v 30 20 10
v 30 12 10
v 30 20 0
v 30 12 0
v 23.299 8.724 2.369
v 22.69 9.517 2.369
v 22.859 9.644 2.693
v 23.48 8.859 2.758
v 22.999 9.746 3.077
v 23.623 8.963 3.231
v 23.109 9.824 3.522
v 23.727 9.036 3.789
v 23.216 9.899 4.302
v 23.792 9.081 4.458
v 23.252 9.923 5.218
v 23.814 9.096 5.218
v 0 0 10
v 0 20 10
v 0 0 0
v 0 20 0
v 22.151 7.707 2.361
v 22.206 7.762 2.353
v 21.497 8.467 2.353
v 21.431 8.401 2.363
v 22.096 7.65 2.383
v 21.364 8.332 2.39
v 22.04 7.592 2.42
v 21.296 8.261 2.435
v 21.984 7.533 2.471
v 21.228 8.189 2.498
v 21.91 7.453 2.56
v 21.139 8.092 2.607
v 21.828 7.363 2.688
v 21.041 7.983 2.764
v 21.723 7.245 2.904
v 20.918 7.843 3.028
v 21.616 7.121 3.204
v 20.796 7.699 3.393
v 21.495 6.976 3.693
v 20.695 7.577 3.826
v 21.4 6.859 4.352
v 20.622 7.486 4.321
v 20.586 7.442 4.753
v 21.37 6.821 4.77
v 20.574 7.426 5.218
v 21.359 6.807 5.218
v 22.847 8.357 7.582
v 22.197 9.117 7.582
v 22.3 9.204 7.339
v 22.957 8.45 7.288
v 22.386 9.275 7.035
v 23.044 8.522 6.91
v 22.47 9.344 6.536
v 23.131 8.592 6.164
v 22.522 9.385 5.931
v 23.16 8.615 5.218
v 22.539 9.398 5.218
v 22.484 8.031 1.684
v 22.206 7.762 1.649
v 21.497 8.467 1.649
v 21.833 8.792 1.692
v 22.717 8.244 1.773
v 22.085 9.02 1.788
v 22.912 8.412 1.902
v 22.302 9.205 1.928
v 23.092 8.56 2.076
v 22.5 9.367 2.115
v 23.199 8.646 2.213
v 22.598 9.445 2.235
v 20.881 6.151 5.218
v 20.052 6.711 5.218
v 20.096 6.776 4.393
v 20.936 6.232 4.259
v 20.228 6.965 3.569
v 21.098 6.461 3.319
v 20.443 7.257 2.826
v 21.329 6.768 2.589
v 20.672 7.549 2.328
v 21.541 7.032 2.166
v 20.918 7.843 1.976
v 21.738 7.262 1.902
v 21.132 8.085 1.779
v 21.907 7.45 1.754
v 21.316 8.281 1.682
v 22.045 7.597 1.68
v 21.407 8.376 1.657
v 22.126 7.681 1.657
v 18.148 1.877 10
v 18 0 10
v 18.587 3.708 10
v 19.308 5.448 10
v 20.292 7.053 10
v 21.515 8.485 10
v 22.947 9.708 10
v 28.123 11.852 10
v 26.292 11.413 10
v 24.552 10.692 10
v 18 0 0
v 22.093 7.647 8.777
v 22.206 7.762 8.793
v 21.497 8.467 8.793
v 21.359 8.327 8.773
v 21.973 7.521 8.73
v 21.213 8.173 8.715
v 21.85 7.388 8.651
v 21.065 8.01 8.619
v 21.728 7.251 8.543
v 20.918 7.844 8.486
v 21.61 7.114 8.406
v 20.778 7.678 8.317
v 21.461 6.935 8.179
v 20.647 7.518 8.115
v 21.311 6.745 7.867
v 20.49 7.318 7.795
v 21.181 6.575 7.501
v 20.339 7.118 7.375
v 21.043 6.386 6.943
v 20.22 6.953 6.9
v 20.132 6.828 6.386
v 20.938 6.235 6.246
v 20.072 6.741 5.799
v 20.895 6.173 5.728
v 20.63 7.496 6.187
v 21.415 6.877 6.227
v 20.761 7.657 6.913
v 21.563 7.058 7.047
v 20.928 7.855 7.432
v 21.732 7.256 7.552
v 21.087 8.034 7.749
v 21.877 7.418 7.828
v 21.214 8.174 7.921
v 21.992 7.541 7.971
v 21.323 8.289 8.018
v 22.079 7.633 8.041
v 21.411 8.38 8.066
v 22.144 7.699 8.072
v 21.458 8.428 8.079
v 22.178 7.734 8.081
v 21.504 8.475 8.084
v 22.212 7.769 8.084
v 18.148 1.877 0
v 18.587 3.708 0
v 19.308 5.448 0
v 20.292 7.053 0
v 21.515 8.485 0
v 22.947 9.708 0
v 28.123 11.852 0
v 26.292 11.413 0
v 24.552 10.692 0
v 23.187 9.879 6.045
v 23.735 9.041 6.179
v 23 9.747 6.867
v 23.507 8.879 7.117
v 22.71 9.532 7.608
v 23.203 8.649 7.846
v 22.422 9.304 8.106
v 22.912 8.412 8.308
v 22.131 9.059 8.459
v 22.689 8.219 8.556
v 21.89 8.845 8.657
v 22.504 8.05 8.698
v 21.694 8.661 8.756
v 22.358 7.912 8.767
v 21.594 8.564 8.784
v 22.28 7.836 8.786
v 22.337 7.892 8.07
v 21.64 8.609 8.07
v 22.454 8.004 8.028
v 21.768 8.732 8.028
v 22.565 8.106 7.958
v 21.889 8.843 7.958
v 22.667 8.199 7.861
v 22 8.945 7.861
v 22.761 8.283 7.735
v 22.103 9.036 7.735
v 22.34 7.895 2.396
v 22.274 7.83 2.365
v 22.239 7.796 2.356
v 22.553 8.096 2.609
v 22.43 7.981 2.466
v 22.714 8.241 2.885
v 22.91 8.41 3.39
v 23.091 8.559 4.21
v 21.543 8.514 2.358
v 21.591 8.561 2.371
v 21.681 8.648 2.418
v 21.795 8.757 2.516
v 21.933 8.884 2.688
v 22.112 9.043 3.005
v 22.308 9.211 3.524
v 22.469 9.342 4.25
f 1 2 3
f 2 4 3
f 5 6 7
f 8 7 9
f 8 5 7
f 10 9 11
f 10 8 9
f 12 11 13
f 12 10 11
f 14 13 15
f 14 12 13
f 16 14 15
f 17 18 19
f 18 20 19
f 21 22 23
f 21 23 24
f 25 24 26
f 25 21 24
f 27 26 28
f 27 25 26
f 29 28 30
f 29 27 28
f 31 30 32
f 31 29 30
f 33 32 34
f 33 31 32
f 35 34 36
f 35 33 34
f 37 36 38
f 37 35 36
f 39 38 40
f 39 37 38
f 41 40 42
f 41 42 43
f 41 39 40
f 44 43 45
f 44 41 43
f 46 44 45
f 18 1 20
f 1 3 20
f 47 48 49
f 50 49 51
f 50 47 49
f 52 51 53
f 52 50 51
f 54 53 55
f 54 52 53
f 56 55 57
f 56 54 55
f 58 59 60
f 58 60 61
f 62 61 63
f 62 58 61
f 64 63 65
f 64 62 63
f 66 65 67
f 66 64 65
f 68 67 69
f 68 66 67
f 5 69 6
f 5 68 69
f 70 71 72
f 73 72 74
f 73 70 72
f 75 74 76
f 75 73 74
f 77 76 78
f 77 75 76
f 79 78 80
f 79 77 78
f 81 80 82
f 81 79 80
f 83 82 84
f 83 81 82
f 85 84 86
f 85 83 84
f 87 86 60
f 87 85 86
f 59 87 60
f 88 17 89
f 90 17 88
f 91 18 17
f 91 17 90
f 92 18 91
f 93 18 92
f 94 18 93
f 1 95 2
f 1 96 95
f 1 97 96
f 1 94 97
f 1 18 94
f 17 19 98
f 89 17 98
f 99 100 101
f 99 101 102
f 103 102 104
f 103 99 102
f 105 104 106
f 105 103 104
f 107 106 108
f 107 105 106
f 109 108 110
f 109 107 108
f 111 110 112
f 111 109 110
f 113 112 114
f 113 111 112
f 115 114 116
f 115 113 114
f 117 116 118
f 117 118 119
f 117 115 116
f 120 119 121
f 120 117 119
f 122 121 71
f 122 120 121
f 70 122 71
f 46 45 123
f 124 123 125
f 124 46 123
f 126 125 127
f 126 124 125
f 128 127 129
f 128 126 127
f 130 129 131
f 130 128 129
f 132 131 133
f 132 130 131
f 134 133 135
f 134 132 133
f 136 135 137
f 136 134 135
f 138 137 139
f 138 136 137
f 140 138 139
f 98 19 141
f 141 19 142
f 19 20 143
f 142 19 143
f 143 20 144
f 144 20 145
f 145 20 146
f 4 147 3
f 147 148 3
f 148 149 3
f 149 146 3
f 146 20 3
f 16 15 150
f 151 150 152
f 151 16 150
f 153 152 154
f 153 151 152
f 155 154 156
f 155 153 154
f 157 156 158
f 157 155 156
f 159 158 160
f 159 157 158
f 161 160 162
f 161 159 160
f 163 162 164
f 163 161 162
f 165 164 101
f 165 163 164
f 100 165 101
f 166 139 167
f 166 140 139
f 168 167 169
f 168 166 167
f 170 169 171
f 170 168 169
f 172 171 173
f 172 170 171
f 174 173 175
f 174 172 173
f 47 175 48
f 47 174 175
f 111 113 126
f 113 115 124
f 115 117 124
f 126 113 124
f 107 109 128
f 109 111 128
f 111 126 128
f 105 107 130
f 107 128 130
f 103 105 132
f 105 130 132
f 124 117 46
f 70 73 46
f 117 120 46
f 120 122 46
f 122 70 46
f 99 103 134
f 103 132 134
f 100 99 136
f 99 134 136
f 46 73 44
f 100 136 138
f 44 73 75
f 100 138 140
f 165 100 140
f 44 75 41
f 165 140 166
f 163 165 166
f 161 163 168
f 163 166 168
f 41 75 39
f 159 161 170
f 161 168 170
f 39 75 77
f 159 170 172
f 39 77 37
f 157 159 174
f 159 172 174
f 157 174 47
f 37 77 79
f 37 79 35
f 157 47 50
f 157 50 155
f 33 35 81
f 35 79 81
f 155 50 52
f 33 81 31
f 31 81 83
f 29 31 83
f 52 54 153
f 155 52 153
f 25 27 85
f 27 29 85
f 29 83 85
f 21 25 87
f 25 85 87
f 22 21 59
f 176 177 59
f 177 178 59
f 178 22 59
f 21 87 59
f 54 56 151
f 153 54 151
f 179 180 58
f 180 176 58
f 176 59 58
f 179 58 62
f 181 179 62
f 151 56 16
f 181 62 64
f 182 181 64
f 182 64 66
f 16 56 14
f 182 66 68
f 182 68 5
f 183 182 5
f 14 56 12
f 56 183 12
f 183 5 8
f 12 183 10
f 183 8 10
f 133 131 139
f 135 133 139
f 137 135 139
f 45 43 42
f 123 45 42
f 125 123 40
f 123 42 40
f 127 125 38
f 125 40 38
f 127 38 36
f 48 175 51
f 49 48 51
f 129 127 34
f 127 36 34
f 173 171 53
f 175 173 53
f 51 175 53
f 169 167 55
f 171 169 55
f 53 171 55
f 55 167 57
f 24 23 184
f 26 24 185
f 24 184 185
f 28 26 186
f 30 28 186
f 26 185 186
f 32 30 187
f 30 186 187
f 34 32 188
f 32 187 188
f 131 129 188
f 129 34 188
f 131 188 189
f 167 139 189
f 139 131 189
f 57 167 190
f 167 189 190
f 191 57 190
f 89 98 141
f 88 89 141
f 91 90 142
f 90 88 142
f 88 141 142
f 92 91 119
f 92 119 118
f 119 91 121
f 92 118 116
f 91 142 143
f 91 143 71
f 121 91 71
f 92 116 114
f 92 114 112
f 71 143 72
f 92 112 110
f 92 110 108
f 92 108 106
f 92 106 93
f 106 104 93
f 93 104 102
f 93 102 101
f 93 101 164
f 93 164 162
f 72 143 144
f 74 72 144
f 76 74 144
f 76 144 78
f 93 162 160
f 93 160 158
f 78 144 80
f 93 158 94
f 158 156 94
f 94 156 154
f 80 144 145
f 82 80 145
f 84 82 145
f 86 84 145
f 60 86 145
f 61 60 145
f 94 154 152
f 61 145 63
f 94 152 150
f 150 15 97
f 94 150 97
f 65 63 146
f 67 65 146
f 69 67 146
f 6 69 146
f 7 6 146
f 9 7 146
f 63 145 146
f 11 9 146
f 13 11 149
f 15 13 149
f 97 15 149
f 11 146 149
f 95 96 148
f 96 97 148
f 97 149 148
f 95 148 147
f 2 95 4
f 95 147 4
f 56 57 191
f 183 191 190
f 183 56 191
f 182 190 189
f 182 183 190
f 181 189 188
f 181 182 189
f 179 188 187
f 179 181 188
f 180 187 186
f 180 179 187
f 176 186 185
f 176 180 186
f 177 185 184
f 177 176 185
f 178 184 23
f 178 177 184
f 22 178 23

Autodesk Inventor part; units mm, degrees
ref_plane "YZ Plane" through (0, 0, 0) normal (1, 0, 0) x (0, 1, 0)
ref_plane "XZ Plane" through (0, 0, 0) normal (0, 1, 0) x (-1, 0, 0)
sketch "Sketch1" plane through (0, 0, 0) normal (0, 0, 1) x (1, 0, 0)
  line L0 (0, 0) -> (18, 0)
  line L1 (30, 12) -> (30, 20)
  line L2 (30, 20) -> (0, 20)
  line L3 (0, 20) -> (0, 0)
  arc A0 (30, 12) -> (18, 0) centre (30, 0) ccw
  dimension "d0" = 30
  dimension "d1" = 20
  dimension "d2" = 12
extrude "Extrusion1" add sketch "Sketch1" along normal blind 10
sketch "Sketch2" plane through (0, 0, 0) normal (0, -1, 0) x (1, 0, 0)
  line L0 (6.7288, 8.7537) -> (12.1656, 8.7537) construction
  line L1 (12.1656, 8.7537) -> (12.1656, 1.727) construction
  line L2 (12.1656, 1.727) -> (6.7288, 1.727) construction
  line L3 (6.7288, 1.727) -> (6.7288, 8.7537) construction
sketch "Sketch3" plane through (30, 12, 0) normal (1, 0, 0) x (0, 0, -1)
  line L0 (-8.6261, 1.3146) -> (-8.6261, 6.7514) construction
  line L1 (-8.6261, 6.7514) -> (-1.482, 6.7514) construction
  line L2 (-1.482, 6.7514) -> (-1.482, 1.3146) construction
  line L3 (-1.482, 1.3146) -> (-8.6261, 1.3146) construction
sketch "Sketch4" plane through (0, 20, 0) normal (0, 1, 0) x (1, 0, 0)
  line L0 (16.9923, -8.3919) -> (11.5555, -8.3919) construction
  line L1 (11.5555, -8.3919) -> (11.5555, -1.3919) construction
  line L2 (11.5555, -1.3919) -> (16.9923, -1.3919) construction
  line L3 (16.9923, -1.3919) -> (16.9923, -8.3919) construction
sketch "Sketch5" plane through (0, 0, 0) normal (-1, 0, 0) x (0, 0, 1)
  line L0 (8.5269, 13.0876) -> (8.5269, 7.6509) construction
  line L1 (8.5269, 7.6509) -> (1.5002, 7.6509) construction
  line L2 (1.5002, 7.6509) -> (1.5002, 13.0876) construction
  line L3 (1.5002, 13.0876) -> (8.5269, 13.0876) construction
sketch "Sketch6" plane through (0, 0, 10) normal (0, 0, 1) x (1, 0, 0)
  line L0 (8.4775, 14.4017) -> (13.9142, 14.4017) construction
  line L1 (13.9142, 14.4017) -> (13.9142, 7.4924) construction
  line L2 (13.9142, 7.4924) -> (8.4775, 7.4924) construction
  line L3 (8.4775, 7.4924) -> (8.4775, 14.4017) construction
sketch "Sketch7" plane through (0, 0, 0) normal (0, 0, -1) x (-1, 0, 0)
  line L0 (-16.3171, 15.4982) -> (-10.8803, 15.4982) construction
  line L1 (-10.8803, 15.4982) -> (-10.8803, 8.3541) construction
  line L2 (-10.8803, 8.3541) -> (-16.3171, 8.3541) construction
  line L3 (-16.3171, 8.3541) -> (-16.3171, 15.4982) construction
ref_plane "Work Plane1" through (18, 0, 0) normal (-0.7071068, 0.7071068, 0) x (0, 0, 1)
sketch "Sketch9" plane through (18, 0, 0) normal (-0.7071068, 0.7071068, 0) x (0, 0, 1)
  line L0 (8.7931, 11.1492) -> (8.7931, 5.7124) construction
  line L1 (8.7931, 5.7124) -> (1.7665, 5.7124) construction
  line L2 (1.7665, 5.7124) -> (1.7665, 11.1492) construction
  line L3 (1.7665, 11.1492) -> (8.7931, 11.1492) construction
  spline S0 degree 4 poles (5.2185, 10.7437) (6.4616, 10.7437) (7.9768, 10.2315) (8.7931, 9.2284) (8.7931, 8.4601) knots 0 0 0 0 0 1 1 1 1 1
  spline S1 degree 5 poles (8.7931, 8.4601) (8.7931, 7.8999) (8.3396, 7.0463) (7.486, 6.4967) (6.2589, 6.1819) (5.2185, 6.1819) knots 0 0 0 0 0 0 1 1 1 1 1 1
  spline S2 degree 4 poles (5.2185, 6.1819) (3.986, 6.1819) (2.4707, 6.6888) (1.6491, 7.6972) (1.6491, 8.4601) knots 0 0 0 0 0 1 1 1 1 1
  spline S3 degree 2 poles (1.6491, 8.4601) (1.6491, 9.4739) (2.3694, 10.0501) knots 0 0 0 1 1 1
  spline S4 degree 2 poles (2.3694, 10.0501) (3.2497, 10.7437) (5.2185, 10.7437) knots 0 0 0 1 1 1
  spline S5 degree 3 poles (5.2185, 9.858) (3.4898, 9.858) (2.3534, 9.0524) (2.3534, 8.4601) knots 0 0 0 0 1 1 1 1
  spline S6 degree 3 poles (2.3534, 8.4601) (2.3534, 7.8733) (3.4951, 7.0676) (5.2185, 7.0676) knots 0 0 0 0 1 1 1 1
  spline S7 degree 3 poles (5.2185, 7.0676) (6.9471, 7.0676) (8.0835, 7.8733) (8.0835, 8.4708) knots 0 0 0 0 1 1 1 1
  spline S8 degree 2 poles (8.0835, 8.4708) (8.0835, 9.063) (7.582, 9.4152) knots 0 0 0 1 1 1
  spline S9 degree 2 poles (7.582, 9.4152) (6.9418, 9.858) (5.2185, 9.858) knots 0 0 0 1 1 1
emboss "Emboss1" sketch "Sketch9" operation add depth 1 direction (0.7071068, -0.7071068, 0) wrap yes faces at (21.8379, 8.7966, 6.6667)
properties part number "block"
